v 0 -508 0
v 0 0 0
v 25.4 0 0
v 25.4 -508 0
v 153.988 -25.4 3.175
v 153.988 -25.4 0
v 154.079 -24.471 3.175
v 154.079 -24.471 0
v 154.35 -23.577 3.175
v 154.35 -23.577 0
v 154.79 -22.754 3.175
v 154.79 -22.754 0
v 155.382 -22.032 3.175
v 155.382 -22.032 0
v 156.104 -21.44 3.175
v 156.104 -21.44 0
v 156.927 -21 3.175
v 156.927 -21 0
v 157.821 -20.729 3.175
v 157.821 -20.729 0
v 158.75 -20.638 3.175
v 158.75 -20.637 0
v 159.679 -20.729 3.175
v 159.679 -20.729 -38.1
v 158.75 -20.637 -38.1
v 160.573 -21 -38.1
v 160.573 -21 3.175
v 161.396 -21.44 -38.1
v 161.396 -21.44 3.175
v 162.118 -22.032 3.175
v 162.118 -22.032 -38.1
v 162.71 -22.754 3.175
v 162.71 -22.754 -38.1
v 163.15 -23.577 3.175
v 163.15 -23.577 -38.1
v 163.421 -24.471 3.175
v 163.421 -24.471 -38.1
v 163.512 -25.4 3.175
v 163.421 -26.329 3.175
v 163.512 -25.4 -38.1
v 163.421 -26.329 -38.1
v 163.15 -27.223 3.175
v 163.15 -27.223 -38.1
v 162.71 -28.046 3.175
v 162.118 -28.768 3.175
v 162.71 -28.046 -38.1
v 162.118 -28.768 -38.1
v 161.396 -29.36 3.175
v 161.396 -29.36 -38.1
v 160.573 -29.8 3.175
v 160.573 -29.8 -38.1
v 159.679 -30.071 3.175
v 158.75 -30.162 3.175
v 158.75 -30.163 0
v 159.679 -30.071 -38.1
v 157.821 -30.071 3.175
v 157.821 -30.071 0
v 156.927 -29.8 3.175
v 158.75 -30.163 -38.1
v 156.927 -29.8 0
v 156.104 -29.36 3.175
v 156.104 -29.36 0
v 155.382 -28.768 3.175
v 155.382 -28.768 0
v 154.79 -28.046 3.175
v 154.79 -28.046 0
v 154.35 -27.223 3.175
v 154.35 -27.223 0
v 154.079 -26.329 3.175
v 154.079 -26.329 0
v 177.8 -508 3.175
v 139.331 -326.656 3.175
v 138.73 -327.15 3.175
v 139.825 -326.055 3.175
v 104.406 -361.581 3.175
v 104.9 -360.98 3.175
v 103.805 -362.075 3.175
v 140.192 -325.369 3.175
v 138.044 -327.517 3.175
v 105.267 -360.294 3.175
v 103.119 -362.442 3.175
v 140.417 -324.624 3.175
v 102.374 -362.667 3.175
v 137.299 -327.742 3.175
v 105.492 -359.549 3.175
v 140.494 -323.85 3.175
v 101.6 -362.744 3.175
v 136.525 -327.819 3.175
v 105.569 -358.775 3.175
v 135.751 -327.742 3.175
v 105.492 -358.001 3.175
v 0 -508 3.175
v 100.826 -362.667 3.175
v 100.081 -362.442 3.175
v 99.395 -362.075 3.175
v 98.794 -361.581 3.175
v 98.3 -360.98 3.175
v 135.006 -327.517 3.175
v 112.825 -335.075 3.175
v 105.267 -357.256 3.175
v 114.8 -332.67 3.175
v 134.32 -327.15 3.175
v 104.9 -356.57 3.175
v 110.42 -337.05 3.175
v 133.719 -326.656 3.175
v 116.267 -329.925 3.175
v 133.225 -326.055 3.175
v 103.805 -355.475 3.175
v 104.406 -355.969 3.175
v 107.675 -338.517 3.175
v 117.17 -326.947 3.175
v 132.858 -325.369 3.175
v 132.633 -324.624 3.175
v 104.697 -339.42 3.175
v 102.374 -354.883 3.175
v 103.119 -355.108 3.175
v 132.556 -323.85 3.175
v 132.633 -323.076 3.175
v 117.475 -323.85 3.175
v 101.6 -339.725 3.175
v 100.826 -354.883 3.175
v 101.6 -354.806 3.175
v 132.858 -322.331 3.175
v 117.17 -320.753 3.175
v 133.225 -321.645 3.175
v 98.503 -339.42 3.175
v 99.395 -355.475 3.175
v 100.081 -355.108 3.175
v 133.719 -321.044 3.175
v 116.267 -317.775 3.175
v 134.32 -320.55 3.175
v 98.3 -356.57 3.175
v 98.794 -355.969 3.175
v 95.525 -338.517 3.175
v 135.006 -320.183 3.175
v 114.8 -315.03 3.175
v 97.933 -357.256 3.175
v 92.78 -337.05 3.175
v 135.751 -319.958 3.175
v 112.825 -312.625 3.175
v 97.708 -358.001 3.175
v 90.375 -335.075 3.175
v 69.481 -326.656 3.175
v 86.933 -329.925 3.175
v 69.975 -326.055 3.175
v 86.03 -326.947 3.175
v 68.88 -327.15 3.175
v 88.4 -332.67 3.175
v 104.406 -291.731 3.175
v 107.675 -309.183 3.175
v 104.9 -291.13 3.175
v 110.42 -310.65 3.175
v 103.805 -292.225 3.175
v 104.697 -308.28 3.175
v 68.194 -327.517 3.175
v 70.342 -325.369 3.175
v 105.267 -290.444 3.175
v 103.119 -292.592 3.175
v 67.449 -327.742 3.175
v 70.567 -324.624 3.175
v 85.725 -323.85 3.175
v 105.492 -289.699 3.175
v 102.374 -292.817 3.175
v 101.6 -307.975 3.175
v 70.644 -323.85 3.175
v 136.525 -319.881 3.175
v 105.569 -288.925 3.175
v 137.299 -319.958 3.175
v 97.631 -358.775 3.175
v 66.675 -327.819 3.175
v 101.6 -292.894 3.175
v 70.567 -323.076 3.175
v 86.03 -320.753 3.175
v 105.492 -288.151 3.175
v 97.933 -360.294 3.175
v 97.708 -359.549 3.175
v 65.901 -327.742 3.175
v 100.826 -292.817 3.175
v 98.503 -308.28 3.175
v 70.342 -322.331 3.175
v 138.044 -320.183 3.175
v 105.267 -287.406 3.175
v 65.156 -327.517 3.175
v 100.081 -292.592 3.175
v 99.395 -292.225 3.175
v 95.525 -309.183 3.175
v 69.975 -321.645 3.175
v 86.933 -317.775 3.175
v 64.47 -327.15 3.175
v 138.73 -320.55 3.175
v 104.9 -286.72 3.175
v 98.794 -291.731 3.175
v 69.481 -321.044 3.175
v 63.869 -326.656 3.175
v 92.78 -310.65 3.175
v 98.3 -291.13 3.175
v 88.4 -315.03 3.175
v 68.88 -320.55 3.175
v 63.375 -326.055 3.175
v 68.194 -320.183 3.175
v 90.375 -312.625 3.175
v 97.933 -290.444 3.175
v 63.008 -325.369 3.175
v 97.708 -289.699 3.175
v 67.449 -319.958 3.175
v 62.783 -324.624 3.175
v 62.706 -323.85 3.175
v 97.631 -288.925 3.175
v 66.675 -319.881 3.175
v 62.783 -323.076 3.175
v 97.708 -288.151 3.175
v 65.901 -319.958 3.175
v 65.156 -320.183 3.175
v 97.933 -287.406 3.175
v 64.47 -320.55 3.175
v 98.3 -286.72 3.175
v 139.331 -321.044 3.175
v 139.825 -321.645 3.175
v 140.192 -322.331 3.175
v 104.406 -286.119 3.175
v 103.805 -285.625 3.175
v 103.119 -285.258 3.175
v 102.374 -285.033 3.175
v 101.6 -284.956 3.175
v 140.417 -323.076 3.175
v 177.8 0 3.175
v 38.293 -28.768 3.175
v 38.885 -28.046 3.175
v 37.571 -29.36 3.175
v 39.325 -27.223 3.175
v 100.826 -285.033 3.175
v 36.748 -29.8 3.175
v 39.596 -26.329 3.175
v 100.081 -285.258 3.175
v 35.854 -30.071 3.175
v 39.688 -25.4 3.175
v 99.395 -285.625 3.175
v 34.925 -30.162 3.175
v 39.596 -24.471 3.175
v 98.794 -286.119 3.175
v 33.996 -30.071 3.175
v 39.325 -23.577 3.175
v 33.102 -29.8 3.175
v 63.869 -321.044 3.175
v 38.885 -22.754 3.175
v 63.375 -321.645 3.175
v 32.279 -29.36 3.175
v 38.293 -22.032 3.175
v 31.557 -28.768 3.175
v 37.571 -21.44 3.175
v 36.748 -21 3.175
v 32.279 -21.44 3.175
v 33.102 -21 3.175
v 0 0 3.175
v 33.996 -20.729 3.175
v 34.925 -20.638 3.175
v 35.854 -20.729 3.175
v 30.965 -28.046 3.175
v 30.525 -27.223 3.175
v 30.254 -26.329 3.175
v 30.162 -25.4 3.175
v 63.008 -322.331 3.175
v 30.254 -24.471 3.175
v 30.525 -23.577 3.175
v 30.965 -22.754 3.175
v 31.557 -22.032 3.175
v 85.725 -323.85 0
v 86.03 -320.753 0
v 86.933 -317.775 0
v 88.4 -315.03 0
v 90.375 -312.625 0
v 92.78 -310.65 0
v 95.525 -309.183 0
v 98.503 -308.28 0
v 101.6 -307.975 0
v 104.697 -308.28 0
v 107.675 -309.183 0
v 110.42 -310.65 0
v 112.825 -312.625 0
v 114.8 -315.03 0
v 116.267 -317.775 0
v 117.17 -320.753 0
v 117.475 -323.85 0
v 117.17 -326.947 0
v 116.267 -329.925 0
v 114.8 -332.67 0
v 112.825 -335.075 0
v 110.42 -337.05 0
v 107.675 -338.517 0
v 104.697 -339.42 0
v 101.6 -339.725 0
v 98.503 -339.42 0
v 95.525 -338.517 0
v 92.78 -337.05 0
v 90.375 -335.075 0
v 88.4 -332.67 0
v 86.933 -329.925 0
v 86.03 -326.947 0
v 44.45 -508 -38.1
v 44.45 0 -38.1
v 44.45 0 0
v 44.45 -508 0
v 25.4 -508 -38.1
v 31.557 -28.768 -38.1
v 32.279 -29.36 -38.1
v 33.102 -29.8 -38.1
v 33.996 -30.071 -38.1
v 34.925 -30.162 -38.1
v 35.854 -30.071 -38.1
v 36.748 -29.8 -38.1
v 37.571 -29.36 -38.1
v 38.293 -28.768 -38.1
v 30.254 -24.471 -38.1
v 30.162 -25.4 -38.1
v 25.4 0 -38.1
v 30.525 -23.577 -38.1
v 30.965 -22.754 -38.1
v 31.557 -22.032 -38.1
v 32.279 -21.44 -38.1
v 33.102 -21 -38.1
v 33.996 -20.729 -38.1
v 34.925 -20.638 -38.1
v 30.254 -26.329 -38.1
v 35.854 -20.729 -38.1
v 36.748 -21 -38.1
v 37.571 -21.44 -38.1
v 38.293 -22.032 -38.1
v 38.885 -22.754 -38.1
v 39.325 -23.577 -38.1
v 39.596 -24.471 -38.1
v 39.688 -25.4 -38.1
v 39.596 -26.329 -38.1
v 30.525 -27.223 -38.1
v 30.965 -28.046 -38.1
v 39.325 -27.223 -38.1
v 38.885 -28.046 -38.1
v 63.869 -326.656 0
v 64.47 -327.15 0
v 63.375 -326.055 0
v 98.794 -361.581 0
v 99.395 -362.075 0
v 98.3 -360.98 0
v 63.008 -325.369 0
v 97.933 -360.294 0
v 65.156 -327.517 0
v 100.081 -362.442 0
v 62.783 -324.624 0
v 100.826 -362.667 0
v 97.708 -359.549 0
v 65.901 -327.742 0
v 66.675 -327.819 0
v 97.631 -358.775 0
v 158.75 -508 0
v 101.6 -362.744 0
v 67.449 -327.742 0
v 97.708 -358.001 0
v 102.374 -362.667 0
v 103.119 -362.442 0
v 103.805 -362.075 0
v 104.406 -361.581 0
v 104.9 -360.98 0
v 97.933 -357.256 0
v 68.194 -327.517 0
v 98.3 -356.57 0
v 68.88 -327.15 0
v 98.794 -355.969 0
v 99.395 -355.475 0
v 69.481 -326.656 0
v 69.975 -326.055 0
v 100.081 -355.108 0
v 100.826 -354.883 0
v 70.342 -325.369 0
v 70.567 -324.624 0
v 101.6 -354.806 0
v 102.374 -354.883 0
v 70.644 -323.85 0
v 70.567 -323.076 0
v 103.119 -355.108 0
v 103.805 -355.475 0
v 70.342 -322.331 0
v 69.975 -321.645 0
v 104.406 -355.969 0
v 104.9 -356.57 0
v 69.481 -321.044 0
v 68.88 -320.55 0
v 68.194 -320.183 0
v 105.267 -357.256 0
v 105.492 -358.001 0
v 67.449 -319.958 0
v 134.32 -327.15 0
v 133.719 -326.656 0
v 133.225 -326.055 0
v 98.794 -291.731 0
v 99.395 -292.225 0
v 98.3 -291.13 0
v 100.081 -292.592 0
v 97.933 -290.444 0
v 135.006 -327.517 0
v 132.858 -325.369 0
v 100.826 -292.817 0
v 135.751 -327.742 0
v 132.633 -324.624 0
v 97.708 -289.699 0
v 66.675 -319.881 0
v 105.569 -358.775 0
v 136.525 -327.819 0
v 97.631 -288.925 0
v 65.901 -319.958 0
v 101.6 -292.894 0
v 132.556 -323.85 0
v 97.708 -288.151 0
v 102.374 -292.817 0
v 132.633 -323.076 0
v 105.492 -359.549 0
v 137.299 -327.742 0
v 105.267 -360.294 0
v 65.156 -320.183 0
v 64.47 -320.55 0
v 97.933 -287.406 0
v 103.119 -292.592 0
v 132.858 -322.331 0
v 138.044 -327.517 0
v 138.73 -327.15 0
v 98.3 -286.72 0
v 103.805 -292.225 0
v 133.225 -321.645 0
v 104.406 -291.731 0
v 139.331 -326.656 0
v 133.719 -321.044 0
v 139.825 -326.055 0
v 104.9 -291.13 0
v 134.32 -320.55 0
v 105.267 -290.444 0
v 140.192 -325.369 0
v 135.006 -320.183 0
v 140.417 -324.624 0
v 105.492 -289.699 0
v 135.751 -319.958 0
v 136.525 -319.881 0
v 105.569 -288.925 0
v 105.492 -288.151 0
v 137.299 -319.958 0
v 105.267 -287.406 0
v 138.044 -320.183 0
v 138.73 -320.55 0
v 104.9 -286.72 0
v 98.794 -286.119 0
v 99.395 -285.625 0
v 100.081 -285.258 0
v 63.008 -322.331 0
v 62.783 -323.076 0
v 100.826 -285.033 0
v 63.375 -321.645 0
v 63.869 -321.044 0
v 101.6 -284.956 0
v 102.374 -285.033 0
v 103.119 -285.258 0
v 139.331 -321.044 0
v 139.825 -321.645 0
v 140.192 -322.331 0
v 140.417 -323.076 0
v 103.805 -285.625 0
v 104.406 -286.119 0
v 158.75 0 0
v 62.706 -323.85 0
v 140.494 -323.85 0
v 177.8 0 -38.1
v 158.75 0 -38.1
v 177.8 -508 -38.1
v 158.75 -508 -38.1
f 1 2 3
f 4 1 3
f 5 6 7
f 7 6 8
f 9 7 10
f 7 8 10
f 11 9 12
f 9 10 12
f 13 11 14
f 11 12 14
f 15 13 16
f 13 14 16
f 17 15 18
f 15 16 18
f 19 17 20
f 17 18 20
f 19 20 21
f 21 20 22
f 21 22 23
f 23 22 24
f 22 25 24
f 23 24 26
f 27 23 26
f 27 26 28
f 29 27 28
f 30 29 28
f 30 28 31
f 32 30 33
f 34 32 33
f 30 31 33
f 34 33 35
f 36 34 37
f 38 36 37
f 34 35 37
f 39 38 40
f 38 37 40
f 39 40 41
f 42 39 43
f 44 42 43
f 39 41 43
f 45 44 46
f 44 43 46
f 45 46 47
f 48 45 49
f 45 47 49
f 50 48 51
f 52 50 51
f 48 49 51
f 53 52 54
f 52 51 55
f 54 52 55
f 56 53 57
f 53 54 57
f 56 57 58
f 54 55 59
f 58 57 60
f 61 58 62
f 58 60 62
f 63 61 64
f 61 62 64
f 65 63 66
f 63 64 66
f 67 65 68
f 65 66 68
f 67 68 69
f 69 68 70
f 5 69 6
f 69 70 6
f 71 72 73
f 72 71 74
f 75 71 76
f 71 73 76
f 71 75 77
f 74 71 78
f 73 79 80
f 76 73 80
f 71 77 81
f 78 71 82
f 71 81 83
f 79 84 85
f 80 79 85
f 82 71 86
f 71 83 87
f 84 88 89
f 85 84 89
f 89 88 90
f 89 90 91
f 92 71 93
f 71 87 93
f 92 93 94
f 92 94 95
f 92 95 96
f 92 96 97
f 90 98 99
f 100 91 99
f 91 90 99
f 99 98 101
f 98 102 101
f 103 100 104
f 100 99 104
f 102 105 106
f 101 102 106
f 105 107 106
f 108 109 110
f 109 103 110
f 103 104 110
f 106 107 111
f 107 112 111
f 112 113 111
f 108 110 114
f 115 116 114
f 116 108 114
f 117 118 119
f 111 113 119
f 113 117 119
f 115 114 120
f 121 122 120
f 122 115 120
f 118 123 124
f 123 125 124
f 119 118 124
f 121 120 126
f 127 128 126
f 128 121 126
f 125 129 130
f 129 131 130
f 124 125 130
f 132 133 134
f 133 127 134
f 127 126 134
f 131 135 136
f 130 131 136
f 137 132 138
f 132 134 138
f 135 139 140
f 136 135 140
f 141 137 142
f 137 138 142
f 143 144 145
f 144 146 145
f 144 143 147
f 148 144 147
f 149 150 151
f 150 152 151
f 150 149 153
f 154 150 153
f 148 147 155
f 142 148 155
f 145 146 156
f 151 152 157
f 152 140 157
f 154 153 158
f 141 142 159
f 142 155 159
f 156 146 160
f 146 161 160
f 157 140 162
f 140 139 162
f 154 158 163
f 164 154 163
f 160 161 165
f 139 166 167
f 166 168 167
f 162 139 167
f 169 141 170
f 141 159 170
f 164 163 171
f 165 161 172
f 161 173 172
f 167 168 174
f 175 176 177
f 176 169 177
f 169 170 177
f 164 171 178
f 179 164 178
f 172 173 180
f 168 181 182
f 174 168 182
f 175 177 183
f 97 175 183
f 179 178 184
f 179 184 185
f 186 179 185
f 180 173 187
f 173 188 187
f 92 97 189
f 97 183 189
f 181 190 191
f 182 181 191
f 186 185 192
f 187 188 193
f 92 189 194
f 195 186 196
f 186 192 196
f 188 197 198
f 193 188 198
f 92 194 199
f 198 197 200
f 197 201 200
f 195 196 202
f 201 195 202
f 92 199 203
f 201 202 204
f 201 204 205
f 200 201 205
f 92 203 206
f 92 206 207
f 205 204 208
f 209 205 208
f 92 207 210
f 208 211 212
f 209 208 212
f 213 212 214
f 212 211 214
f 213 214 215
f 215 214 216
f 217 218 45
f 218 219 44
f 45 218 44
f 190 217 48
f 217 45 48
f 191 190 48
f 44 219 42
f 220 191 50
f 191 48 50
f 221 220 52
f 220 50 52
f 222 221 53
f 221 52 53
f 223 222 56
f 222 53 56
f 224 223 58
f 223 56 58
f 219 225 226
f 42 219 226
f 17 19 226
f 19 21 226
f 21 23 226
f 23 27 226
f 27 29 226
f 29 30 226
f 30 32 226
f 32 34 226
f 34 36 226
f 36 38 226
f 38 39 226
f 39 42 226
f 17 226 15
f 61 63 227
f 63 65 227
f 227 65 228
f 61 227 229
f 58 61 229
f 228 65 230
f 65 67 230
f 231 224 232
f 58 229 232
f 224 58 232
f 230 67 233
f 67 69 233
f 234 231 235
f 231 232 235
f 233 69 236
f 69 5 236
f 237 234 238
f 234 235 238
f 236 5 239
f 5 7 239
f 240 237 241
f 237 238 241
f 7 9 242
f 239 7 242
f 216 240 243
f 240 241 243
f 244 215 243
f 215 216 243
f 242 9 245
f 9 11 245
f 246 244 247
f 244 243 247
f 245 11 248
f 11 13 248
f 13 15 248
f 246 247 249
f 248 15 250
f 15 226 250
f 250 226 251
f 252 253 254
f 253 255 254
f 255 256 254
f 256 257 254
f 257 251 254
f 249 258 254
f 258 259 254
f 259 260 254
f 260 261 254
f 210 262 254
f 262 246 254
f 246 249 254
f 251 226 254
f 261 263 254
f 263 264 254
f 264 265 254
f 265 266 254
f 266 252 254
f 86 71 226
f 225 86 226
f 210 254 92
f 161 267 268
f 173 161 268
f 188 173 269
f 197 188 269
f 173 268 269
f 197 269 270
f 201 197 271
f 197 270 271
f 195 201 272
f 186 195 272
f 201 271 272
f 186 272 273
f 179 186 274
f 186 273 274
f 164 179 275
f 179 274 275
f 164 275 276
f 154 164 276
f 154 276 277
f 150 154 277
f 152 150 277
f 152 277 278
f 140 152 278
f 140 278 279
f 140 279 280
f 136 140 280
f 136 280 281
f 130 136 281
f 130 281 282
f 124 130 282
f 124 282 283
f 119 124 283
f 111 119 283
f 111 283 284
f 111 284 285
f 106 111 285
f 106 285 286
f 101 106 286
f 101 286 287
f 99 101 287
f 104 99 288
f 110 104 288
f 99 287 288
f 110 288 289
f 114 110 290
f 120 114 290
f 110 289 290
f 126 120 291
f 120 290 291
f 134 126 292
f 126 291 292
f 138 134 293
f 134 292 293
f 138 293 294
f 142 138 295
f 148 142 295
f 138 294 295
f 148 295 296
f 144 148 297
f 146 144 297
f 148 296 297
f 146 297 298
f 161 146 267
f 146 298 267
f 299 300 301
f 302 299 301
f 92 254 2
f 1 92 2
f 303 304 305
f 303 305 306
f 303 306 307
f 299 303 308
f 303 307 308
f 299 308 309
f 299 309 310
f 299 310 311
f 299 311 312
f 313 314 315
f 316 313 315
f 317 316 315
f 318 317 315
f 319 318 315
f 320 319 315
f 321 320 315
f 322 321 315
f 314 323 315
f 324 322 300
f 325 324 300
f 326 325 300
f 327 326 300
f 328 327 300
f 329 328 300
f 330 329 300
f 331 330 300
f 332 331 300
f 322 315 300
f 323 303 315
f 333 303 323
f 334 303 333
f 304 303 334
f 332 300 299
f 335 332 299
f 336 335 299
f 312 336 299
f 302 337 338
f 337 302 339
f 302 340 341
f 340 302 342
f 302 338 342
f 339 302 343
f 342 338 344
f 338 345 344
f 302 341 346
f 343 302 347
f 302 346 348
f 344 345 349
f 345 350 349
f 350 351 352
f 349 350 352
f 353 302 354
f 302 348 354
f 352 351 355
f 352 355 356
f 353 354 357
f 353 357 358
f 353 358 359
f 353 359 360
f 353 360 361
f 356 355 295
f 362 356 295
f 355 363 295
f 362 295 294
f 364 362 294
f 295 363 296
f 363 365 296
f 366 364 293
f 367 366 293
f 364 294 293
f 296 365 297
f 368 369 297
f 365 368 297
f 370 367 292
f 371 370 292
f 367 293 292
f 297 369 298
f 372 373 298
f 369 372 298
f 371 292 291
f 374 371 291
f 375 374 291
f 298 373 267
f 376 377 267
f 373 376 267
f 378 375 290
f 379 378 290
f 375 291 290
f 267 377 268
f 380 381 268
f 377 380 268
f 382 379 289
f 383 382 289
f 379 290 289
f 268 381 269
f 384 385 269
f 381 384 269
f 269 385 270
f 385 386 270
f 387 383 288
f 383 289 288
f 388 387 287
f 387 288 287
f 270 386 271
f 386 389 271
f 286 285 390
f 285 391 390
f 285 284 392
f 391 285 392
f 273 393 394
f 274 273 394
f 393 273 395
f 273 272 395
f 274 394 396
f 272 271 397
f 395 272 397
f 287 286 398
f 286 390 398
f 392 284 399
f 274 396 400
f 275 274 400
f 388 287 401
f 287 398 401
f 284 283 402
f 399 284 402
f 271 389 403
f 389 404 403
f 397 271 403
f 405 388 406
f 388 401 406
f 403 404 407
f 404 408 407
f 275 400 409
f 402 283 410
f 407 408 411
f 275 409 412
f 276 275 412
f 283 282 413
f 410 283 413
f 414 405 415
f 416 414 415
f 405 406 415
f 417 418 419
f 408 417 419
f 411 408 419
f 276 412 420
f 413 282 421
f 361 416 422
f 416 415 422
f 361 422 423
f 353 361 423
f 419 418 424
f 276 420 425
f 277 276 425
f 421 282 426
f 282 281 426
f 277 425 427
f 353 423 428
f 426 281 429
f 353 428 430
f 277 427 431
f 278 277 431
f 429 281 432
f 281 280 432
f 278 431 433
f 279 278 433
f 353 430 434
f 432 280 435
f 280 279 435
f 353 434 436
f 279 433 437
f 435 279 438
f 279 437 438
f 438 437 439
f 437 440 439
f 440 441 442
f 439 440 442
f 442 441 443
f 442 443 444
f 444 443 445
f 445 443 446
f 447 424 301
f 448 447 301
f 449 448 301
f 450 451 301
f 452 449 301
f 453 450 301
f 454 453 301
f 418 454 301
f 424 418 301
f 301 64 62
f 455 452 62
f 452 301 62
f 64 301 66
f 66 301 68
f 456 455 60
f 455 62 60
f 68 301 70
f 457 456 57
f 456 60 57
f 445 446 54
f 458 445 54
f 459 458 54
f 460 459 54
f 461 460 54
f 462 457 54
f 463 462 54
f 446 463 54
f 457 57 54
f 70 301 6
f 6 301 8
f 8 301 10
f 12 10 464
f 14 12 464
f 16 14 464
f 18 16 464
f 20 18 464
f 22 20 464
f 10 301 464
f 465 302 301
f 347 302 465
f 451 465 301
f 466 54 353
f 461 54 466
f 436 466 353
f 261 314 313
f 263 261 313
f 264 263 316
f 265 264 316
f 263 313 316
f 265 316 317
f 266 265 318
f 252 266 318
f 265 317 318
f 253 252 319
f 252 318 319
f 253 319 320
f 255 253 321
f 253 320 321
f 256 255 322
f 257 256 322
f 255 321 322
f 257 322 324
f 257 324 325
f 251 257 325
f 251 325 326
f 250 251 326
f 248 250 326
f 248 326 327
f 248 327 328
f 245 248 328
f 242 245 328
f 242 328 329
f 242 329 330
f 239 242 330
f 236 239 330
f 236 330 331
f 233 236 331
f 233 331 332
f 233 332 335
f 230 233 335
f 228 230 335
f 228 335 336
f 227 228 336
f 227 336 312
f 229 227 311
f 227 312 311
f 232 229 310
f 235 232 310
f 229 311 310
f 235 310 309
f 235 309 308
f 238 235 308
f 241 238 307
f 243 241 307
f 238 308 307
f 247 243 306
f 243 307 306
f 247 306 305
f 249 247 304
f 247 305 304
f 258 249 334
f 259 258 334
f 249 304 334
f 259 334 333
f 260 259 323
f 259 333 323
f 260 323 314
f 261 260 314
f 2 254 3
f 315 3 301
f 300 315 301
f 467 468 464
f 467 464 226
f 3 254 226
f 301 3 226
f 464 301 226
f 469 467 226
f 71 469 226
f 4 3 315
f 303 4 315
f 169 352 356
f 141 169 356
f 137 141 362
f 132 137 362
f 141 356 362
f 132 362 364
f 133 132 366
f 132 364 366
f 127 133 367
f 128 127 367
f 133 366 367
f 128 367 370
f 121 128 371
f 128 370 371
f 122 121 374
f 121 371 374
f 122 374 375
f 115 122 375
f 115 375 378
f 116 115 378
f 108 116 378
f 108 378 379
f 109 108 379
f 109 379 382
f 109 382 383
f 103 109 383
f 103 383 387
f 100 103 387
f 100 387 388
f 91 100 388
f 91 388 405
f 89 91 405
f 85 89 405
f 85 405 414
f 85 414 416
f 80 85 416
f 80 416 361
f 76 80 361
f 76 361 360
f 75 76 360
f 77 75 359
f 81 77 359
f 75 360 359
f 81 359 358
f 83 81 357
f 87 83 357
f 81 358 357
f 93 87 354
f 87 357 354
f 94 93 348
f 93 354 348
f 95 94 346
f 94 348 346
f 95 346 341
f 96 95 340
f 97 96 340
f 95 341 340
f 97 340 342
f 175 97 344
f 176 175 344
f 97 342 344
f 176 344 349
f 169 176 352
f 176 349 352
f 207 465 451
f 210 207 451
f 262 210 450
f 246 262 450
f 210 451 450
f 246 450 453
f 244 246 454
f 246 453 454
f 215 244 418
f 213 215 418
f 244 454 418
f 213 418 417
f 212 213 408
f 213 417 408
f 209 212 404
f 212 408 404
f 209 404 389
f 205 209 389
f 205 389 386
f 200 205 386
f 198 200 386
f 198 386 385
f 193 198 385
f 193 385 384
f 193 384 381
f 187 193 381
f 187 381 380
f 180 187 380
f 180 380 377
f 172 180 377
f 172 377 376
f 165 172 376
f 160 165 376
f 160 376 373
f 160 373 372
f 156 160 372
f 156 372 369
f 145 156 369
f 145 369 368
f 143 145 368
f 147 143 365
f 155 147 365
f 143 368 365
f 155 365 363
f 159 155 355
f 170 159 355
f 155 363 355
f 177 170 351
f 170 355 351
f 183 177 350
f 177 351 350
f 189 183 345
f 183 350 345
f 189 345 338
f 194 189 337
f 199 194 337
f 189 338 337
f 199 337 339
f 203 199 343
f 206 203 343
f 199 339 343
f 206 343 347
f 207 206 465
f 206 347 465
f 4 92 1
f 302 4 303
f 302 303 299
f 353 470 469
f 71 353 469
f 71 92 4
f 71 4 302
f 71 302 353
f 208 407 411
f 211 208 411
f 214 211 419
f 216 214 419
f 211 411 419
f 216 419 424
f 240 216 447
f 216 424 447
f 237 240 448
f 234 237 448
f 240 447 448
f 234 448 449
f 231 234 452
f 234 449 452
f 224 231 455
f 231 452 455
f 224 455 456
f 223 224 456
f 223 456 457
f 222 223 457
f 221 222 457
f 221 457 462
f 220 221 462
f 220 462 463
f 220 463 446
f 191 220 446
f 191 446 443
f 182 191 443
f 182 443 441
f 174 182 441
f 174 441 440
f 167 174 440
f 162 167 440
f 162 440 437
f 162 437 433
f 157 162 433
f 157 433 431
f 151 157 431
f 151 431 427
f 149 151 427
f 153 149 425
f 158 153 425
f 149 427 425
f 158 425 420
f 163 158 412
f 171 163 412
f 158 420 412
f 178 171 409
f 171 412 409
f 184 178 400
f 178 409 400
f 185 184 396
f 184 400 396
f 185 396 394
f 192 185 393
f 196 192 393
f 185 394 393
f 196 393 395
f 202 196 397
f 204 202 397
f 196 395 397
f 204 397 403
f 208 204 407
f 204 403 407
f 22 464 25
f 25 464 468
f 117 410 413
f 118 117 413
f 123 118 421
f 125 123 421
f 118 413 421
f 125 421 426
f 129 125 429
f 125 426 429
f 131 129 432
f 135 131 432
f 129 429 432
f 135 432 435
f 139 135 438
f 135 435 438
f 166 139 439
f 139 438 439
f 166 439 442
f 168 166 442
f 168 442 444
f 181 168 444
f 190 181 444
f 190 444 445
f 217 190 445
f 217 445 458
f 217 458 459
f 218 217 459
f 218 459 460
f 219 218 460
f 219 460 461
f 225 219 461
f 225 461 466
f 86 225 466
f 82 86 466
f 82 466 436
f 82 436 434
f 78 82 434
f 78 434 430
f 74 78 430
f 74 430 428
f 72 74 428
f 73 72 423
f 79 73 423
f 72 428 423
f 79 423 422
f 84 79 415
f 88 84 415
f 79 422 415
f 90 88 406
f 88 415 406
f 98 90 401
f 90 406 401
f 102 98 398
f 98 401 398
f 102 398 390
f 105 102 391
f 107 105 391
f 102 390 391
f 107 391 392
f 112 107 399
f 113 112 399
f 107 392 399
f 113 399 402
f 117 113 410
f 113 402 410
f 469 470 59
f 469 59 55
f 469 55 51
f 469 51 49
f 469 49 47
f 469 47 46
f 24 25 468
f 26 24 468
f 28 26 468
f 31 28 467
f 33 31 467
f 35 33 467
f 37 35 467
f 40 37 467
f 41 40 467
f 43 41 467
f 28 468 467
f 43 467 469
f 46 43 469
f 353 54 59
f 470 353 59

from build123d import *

# Parameters (mm, degrees)
F1_DEPTH = 508
F3_D     = 31.75
F5_D     = 7.9375
F7_D     = 9.525


with BuildPart() as f1:
    # F0 (on Front) → F1 (new body)
    with BuildSketch(Plane.XZ):
        Polygon((0, 3.175), (0, 0), (25.4, 0), (25.4, -38.1), (44.45, -38.1), (44.45, 0), (158.75, 0), (158.75, -38.1), (177.8, -38.1), (177.8, 0), (177.8, 3.175), align=None)
    extrude(amount=F1_DEPTH)

    # F3 (through all)
    with Locations(Plane.XY.offset(3.175)):
        with Locations((101.6, -323.85)):
            Hole(F3_D / 2)

    # F5 (through all)
    with Locations(Plane.XY.offset(3.175)):
        with Locations((101.6, -288.925), (136.525, -323.85), (101.6, -358.775), (66.675, -323.85)):
            Hole(F5_D / 2)

    # F7 (through all)
    with Locations(Plane.XY.offset(3.175)):
        with Locations((34.925, -25.4), (158.75, -25.4)):
            Hole(F7_D / 2)


solid = f1.part
